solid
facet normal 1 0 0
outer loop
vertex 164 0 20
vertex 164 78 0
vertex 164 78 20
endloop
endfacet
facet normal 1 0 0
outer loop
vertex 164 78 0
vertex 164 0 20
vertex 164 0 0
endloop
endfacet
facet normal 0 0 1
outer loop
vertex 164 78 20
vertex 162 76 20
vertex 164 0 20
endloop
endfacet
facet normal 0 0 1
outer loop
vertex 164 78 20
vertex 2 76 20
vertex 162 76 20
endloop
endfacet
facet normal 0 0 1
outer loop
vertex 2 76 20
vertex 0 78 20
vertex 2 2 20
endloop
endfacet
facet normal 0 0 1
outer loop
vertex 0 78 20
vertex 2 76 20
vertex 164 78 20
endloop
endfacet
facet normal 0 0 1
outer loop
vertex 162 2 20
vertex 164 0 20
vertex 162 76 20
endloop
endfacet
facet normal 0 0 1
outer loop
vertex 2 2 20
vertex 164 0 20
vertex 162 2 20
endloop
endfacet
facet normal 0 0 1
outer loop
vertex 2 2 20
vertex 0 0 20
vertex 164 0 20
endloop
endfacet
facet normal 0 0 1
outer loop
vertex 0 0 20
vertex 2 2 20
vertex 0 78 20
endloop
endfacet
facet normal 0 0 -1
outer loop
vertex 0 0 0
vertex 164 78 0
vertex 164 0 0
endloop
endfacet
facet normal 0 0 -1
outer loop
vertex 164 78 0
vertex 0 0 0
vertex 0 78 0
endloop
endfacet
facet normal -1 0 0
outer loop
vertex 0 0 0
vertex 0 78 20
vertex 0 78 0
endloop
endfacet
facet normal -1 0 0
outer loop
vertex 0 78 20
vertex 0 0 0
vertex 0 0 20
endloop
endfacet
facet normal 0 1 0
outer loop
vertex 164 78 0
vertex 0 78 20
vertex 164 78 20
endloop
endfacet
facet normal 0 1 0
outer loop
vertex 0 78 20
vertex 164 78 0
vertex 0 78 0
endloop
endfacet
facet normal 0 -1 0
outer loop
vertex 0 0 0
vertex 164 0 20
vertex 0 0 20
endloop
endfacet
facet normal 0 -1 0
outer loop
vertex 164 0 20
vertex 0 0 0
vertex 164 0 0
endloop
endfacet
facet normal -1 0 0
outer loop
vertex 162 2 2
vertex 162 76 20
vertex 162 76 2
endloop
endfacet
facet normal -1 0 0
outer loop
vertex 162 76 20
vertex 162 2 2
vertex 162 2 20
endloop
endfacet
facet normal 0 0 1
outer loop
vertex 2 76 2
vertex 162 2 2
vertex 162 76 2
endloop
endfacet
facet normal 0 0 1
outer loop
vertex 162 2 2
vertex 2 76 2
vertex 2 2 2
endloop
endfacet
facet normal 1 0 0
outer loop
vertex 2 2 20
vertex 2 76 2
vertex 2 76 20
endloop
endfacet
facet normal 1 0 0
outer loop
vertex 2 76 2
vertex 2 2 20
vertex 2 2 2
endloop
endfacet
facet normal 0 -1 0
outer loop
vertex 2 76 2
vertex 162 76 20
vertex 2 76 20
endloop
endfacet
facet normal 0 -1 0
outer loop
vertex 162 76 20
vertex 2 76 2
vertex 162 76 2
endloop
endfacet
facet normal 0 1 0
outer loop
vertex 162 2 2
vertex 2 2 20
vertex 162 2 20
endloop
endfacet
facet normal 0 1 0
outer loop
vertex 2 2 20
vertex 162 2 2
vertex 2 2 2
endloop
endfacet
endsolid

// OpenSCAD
// Box enclosure for 160x74x18mm object

// Inner dimensions (the object to enclose)
inner_length = 160;
inner_width = 74;
inner_height = 18;

// Wall thickness
wall = 2;

// Outer dimensions
outer_length = inner_length + 2 * wall;
outer_width = inner_width + 2 * wall;
outer_height = inner_height + wall; // wall on bottom only, open top

difference() {
    // Outer shell
    cube([outer_length, outer_width, outer_height]);

    // Inner cavity
    translate([wall, wall, wall])
        cube([inner_length, inner_width, inner_height + 1]); // +1 to cut through top
}
